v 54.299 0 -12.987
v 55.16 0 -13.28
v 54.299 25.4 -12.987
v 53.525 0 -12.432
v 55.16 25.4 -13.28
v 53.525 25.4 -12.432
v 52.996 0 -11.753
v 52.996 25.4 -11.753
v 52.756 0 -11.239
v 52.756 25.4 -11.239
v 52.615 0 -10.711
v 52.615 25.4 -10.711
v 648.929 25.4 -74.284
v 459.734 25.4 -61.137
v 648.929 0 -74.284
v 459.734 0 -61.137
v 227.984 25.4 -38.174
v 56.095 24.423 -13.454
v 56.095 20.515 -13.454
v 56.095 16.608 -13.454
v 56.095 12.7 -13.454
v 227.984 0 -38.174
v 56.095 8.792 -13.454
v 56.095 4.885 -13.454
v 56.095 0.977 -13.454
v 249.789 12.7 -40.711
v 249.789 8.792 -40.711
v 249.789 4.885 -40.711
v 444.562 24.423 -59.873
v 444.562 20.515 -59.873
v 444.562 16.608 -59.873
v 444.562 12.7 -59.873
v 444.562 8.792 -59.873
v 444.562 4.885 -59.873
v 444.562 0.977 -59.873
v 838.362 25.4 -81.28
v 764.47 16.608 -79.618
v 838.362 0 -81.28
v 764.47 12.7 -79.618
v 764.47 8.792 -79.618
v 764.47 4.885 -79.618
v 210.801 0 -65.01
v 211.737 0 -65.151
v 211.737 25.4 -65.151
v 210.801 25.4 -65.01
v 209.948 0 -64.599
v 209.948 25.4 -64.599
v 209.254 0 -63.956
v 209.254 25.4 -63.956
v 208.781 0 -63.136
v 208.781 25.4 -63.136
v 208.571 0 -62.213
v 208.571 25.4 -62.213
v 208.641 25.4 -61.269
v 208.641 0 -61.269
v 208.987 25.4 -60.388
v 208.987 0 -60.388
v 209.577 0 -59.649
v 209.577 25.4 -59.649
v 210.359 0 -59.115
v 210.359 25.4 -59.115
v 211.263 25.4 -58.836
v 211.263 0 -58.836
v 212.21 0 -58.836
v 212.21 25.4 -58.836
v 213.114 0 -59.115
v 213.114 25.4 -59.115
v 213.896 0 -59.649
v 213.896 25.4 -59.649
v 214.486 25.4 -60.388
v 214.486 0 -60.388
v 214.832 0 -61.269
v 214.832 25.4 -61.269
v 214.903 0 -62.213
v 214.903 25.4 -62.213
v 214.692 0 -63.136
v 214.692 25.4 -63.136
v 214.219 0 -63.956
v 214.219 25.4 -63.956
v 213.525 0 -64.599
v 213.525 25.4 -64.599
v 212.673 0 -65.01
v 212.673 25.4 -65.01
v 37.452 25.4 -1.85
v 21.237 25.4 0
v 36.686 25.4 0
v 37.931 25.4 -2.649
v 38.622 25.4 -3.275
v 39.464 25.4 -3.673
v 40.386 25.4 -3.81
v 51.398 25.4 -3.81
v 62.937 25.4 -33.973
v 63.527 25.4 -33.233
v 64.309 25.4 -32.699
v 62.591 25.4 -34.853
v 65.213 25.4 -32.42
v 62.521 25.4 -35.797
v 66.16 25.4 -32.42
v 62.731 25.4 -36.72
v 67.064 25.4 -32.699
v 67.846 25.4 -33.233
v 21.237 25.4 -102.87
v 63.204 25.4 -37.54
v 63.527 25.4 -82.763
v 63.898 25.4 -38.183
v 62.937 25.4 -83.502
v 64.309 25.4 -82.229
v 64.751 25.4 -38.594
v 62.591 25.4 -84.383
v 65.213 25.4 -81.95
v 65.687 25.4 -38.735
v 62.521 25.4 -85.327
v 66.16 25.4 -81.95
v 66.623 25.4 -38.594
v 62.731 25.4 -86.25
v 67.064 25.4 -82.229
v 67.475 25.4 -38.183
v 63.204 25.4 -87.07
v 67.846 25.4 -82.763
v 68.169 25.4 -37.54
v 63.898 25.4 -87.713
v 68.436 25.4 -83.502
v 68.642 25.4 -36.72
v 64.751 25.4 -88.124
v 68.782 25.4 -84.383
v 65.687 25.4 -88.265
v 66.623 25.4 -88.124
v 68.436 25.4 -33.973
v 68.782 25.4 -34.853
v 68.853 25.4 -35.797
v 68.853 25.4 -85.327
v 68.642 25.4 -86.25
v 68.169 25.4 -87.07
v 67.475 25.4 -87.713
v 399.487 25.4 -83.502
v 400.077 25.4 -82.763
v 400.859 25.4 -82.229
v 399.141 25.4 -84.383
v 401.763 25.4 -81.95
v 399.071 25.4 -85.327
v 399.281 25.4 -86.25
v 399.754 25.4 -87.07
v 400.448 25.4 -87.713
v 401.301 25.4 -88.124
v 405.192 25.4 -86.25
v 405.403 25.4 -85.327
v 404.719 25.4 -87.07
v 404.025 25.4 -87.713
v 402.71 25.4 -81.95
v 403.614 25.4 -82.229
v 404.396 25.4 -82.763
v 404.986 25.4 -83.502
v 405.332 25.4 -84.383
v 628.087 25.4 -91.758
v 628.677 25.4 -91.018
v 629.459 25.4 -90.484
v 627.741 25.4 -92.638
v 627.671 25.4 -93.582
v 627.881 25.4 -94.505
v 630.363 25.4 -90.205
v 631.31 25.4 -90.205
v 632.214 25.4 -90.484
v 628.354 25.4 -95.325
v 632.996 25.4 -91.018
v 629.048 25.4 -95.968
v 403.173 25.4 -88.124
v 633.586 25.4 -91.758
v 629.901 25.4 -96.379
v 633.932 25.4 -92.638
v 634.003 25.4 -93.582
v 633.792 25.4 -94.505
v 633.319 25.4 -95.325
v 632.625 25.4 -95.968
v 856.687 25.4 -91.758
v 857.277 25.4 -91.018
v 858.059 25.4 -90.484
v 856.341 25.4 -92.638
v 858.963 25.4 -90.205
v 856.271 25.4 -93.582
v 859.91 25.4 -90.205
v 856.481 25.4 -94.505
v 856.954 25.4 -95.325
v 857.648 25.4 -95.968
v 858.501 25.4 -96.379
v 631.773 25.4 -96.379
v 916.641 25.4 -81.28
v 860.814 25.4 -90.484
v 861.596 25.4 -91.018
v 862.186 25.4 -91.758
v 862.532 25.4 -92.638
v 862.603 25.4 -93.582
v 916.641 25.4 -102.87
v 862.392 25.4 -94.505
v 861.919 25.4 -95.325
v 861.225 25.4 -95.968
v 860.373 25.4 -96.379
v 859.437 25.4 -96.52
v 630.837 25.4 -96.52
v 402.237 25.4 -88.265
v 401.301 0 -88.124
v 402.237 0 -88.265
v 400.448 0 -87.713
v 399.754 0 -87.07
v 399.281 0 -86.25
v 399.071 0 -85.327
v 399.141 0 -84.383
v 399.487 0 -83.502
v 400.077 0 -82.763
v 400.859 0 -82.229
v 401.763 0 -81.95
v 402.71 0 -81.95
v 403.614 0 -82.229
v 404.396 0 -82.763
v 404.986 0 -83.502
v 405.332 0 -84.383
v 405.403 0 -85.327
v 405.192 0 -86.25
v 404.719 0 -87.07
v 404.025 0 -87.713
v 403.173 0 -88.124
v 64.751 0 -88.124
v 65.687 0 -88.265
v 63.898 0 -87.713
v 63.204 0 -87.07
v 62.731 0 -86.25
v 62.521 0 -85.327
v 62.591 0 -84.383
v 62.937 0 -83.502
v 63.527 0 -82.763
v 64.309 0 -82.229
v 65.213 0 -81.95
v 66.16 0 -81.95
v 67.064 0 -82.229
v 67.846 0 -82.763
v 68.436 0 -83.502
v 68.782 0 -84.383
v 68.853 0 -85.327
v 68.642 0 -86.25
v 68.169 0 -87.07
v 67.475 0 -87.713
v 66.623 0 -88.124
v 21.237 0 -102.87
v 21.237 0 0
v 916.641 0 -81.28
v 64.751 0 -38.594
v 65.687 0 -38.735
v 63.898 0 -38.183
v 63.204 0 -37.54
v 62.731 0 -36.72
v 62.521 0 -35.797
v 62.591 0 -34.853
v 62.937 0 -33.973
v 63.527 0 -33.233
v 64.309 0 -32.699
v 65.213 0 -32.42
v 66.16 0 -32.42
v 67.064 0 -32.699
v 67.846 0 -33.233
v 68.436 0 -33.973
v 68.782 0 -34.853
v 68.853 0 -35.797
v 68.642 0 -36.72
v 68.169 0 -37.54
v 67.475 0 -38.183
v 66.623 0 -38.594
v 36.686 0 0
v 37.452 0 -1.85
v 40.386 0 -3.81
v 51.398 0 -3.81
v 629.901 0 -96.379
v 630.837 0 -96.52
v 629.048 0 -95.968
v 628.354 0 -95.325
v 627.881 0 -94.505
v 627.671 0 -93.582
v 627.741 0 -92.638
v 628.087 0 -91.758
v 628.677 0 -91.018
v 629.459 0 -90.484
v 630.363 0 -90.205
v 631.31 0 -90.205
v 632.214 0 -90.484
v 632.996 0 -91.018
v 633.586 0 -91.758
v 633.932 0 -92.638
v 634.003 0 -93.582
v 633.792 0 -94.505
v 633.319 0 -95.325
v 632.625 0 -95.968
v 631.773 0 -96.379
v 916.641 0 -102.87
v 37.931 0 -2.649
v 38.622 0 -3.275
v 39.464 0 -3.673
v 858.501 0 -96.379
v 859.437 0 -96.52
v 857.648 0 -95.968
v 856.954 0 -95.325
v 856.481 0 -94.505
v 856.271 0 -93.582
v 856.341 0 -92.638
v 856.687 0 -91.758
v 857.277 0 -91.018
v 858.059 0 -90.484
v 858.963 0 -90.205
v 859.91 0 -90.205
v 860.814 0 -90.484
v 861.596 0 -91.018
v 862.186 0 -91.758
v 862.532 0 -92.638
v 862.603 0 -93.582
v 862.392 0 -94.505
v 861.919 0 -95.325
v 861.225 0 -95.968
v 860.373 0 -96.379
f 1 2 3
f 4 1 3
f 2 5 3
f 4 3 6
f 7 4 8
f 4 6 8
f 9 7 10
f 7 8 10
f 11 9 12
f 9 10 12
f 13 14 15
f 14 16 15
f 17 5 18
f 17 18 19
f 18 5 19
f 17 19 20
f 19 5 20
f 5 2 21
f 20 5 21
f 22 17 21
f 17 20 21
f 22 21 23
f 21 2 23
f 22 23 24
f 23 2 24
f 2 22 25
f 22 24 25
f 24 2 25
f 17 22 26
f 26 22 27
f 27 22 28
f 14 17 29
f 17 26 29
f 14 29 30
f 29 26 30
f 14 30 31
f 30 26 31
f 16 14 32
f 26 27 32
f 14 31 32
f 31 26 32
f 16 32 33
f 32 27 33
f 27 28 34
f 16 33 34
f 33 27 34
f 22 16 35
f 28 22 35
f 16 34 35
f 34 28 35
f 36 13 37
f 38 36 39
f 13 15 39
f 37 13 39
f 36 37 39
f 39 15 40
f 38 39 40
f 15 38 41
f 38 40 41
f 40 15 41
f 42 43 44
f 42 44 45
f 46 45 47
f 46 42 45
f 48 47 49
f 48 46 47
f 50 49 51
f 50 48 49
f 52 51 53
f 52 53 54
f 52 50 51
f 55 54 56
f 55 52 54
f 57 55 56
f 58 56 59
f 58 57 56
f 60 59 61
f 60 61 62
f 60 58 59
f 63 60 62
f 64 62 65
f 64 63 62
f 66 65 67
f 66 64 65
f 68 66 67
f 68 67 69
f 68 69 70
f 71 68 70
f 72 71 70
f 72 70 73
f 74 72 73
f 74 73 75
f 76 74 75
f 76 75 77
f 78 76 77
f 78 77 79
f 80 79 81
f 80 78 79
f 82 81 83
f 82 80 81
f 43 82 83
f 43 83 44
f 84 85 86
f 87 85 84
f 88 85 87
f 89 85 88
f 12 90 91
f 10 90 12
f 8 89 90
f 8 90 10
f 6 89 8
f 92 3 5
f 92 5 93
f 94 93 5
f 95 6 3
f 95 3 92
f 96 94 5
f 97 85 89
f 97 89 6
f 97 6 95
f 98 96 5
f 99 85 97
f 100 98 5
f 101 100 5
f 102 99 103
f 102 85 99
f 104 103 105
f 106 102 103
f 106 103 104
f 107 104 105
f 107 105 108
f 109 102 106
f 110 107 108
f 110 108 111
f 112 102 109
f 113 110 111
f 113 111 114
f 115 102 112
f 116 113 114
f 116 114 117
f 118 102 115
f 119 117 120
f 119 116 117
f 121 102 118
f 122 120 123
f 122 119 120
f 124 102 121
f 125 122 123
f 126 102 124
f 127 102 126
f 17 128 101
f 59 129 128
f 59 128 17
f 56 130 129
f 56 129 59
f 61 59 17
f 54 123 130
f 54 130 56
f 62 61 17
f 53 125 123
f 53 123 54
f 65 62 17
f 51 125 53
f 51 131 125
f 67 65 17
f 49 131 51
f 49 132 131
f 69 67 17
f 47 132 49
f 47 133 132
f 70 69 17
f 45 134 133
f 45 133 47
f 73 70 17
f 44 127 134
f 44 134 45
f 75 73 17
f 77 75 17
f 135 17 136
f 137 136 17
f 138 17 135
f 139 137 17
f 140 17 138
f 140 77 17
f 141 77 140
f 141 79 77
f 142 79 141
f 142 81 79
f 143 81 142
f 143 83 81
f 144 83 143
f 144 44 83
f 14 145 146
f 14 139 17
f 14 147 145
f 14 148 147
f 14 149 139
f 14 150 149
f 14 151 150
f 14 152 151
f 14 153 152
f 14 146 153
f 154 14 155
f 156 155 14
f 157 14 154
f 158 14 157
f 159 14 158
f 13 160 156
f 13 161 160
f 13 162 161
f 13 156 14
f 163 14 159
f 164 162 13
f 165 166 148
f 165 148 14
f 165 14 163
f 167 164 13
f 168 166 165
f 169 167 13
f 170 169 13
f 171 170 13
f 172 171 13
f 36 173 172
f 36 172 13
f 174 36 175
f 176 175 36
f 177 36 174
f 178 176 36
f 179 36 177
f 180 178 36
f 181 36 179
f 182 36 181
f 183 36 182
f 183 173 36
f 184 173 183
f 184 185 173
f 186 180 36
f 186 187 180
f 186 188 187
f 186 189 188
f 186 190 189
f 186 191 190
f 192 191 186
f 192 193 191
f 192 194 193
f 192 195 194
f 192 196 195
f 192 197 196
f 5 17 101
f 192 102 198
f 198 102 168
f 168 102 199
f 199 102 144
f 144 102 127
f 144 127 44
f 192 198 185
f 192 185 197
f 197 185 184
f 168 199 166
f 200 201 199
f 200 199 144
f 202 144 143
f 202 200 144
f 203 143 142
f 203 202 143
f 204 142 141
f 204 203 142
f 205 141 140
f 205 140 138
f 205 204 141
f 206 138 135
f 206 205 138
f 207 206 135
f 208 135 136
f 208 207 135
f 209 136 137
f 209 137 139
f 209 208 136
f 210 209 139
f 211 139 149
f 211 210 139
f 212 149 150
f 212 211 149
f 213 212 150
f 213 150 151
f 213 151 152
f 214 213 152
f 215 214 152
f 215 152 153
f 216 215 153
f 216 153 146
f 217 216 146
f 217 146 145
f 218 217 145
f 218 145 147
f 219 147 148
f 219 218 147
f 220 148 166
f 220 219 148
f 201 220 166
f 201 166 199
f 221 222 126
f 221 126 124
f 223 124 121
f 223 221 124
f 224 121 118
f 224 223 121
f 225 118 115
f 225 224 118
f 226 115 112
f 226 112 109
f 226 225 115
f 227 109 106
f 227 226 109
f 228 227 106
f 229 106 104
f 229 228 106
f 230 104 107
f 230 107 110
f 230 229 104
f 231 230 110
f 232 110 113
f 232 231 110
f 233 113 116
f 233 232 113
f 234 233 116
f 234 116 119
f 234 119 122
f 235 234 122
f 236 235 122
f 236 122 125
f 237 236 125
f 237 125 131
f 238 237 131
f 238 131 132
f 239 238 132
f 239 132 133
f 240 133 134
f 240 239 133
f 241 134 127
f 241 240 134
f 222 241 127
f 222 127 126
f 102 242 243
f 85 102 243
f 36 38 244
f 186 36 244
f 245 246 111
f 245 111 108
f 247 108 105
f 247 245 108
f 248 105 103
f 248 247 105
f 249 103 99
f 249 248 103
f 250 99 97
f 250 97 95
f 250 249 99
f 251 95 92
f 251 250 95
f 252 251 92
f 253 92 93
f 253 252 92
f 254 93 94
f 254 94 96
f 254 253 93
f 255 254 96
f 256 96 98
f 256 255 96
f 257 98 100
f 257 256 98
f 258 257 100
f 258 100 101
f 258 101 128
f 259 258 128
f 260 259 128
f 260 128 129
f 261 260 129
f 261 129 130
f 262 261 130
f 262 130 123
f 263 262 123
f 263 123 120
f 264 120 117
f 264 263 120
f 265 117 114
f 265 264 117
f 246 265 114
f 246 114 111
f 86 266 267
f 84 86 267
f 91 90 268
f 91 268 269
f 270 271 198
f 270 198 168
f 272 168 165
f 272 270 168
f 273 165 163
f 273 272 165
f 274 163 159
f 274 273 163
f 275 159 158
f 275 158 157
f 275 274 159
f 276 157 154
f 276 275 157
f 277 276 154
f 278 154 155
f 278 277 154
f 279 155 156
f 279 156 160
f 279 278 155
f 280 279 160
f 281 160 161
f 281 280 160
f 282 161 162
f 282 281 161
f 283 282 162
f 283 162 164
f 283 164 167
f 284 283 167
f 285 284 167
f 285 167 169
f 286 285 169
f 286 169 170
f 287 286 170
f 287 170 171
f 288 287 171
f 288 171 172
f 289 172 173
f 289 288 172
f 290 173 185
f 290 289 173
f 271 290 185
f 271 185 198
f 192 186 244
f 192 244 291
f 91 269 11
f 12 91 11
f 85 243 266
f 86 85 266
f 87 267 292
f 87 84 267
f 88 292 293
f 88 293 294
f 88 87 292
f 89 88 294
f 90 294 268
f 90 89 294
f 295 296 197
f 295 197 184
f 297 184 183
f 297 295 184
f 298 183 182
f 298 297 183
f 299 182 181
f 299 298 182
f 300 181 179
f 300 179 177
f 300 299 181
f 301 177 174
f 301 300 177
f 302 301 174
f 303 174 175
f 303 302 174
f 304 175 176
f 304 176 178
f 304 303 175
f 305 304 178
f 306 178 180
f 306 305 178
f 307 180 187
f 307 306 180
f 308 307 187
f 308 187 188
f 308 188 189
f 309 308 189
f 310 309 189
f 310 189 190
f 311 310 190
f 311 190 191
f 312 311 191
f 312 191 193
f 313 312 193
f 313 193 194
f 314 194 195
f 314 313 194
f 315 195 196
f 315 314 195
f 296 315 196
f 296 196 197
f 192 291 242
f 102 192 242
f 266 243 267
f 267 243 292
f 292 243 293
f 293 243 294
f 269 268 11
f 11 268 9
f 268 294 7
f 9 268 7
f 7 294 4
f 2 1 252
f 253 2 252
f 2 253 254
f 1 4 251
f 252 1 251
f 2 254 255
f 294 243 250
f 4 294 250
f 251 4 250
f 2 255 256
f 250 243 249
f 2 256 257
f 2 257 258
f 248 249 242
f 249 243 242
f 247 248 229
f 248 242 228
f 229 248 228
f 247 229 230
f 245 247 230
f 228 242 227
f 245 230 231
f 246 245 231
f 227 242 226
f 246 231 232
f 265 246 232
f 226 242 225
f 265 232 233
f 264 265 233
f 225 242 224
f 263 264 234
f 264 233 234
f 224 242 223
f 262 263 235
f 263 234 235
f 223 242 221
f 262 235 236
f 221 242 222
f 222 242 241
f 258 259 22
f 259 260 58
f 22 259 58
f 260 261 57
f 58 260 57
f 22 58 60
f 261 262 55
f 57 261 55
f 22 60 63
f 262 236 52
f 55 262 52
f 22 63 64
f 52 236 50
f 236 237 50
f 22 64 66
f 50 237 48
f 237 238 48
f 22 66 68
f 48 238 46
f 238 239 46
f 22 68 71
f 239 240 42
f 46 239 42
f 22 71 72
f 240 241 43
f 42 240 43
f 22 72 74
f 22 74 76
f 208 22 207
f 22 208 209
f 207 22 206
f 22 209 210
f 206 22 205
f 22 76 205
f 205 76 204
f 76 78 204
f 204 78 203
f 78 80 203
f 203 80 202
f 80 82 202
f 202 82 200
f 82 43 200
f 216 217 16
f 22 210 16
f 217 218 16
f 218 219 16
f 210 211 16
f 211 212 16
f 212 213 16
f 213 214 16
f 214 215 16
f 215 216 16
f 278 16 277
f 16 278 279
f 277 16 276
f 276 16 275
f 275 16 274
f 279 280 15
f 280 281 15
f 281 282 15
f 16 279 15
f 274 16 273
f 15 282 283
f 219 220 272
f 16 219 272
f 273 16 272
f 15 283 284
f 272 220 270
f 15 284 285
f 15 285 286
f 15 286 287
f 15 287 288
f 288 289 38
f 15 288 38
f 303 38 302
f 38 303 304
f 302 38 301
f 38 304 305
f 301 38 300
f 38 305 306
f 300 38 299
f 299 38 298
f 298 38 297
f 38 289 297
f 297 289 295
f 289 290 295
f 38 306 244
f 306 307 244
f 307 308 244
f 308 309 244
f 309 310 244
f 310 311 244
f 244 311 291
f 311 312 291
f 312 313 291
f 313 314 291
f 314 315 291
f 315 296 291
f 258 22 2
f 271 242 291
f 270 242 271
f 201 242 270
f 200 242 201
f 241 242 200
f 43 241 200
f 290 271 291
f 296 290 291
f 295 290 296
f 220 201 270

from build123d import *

# Parameters (mm, degrees)
SKETCH1_R           = 3.175
BOSS_EXTRUDE1_DEPTH = 25.4
FILLET1_R           = 3.175


with BuildPart() as part:
    # Sketch1 (on Top Plane) → Boss-Extrude1 (new body)
    with BuildSketch(Plane(origin=(0, 0, 0), x_dir=(1, 0, 0), z_dir=(0, 1, 0))):
        with BuildLine():
            Line((21.236708827, 102.87), (21.236708827, 0))
            Line((21.236708827, 0), (33.93670901, 0))
            Line((33.93670901, 0), (36.685985199, 0))
            Line((36.685985199, 0), (38.264138871, 3.81))
            Line((38.264138871, 3.81), (51.398278194, 3.81))
            Line((51.398278194, 3.81), (52.996677053, 12.874970388))
            add(Edge.make_bspline(
                [(52.996677053, 12.874970388), (53.503573659, 12.970456896), (54.499660255, 13.157404611), (56.101158607, 13.455975027), (57.663492356, 13.744988885), (59.683937793, 14.115659666), (62.15348224, 14.563331695), (65.170518963, 15.103156387), (68.231004621, 15.644086126), (72.288386319, 16.351836474), (79.324536107, 17.555493521), (89.492362091, 19.238273344), (105.683337087, 21.809296224), (126.007402708, 24.866297862), (158.54183076, 29.467314799), (199.286173571, 34.777983678), (264.569984849, 42.553821851), (346.311852481, 51.162108318), (444.543686218, 60.086524235), (542.885062348, 67.730751053), (624.910991839, 73.034056624), (690.569900499, 76.552162095), (731.621303417, 78.407861838), (764.4690412, 79.64241837), (789.108361632, 80.421082634), (809.63843083, 80.924660048), (826.066348864, 81.194620604), (834.261568503, 81.28), (838.361715067, 81.28)],
                knots=[0.063996746, 0.063996746, 0.063996746, 0.063996746, 0.065824877, 0.067653009, 0.06948114, 0.071309272, 0.074965534, 0.078621797, 0.08227806, 0.085934322, 0.093246848, 0.107871899, 0.122496949, 0.151747051, 0.180997153, 0.239497356, 0.297997559, 0.414997966, 0.531998373, 0.648998779, 0.765999186, 0.824499389, 0.882999593, 0.912249694, 0.941499796, 0.970749898, 0.985374949, 0.999999999, 0.999999999, 0.999999999, 0.999999999], degree=3))
            Line((838.361715067, 81.28), (889.161715067, 81.28))
            Line((889.161715067, 81.28), (916.641442525, 81.28))
            Line((916.641442525, 81.28), (916.641442525, 83.82))
            Line((916.641442525, 83.82), (916.641442525, 102.87))
            Line((916.641442525, 102.87), (21.236708827, 102.87))
        make_face()
        with Locations(Location((859.436708827, 93.345, 0), (0, 0, 90))):
            Circle(SKETCH1_R, mode=Mode.SUBTRACT)
        with Locations(Location((65.686708827, 85.09, 0), (0, 0, 90))):
            Circle(SKETCH1_R, mode=Mode.SUBTRACT)
        with Locations(Location((211.736708827, 61.976, 0), (0, 0, 90))):
            Circle(SKETCH1_R, mode=Mode.SUBTRACT)
        with Locations(Location((630.836708827, 93.345, 0), (0, 0, 90))):
            Circle(SKETCH1_R, mode=Mode.SUBTRACT)
        with Locations(Location((402.236708827, 85.09, 0), (0, 0, 90))):
            Circle(SKETCH1_R, mode=Mode.SUBTRACT)
        with Locations(Location((65.686708827, 35.56, 0), (0, 0, 90))):
            Circle(SKETCH1_R, mode=Mode.SUBTRACT)
    extrude(amount=BOSS_EXTRUDE1_DEPTH)

    # Fillet1
    fillet1_edges = [part.edges().sort_by_distance(p)[0] for p in [
        (52.996677053, 12.7, -12.874970388),
        (38.264138871, 12.7, -3.81),
    ]]
    fillet(fillet1_edges, radius=FILLET1_R)


solid = part.part
